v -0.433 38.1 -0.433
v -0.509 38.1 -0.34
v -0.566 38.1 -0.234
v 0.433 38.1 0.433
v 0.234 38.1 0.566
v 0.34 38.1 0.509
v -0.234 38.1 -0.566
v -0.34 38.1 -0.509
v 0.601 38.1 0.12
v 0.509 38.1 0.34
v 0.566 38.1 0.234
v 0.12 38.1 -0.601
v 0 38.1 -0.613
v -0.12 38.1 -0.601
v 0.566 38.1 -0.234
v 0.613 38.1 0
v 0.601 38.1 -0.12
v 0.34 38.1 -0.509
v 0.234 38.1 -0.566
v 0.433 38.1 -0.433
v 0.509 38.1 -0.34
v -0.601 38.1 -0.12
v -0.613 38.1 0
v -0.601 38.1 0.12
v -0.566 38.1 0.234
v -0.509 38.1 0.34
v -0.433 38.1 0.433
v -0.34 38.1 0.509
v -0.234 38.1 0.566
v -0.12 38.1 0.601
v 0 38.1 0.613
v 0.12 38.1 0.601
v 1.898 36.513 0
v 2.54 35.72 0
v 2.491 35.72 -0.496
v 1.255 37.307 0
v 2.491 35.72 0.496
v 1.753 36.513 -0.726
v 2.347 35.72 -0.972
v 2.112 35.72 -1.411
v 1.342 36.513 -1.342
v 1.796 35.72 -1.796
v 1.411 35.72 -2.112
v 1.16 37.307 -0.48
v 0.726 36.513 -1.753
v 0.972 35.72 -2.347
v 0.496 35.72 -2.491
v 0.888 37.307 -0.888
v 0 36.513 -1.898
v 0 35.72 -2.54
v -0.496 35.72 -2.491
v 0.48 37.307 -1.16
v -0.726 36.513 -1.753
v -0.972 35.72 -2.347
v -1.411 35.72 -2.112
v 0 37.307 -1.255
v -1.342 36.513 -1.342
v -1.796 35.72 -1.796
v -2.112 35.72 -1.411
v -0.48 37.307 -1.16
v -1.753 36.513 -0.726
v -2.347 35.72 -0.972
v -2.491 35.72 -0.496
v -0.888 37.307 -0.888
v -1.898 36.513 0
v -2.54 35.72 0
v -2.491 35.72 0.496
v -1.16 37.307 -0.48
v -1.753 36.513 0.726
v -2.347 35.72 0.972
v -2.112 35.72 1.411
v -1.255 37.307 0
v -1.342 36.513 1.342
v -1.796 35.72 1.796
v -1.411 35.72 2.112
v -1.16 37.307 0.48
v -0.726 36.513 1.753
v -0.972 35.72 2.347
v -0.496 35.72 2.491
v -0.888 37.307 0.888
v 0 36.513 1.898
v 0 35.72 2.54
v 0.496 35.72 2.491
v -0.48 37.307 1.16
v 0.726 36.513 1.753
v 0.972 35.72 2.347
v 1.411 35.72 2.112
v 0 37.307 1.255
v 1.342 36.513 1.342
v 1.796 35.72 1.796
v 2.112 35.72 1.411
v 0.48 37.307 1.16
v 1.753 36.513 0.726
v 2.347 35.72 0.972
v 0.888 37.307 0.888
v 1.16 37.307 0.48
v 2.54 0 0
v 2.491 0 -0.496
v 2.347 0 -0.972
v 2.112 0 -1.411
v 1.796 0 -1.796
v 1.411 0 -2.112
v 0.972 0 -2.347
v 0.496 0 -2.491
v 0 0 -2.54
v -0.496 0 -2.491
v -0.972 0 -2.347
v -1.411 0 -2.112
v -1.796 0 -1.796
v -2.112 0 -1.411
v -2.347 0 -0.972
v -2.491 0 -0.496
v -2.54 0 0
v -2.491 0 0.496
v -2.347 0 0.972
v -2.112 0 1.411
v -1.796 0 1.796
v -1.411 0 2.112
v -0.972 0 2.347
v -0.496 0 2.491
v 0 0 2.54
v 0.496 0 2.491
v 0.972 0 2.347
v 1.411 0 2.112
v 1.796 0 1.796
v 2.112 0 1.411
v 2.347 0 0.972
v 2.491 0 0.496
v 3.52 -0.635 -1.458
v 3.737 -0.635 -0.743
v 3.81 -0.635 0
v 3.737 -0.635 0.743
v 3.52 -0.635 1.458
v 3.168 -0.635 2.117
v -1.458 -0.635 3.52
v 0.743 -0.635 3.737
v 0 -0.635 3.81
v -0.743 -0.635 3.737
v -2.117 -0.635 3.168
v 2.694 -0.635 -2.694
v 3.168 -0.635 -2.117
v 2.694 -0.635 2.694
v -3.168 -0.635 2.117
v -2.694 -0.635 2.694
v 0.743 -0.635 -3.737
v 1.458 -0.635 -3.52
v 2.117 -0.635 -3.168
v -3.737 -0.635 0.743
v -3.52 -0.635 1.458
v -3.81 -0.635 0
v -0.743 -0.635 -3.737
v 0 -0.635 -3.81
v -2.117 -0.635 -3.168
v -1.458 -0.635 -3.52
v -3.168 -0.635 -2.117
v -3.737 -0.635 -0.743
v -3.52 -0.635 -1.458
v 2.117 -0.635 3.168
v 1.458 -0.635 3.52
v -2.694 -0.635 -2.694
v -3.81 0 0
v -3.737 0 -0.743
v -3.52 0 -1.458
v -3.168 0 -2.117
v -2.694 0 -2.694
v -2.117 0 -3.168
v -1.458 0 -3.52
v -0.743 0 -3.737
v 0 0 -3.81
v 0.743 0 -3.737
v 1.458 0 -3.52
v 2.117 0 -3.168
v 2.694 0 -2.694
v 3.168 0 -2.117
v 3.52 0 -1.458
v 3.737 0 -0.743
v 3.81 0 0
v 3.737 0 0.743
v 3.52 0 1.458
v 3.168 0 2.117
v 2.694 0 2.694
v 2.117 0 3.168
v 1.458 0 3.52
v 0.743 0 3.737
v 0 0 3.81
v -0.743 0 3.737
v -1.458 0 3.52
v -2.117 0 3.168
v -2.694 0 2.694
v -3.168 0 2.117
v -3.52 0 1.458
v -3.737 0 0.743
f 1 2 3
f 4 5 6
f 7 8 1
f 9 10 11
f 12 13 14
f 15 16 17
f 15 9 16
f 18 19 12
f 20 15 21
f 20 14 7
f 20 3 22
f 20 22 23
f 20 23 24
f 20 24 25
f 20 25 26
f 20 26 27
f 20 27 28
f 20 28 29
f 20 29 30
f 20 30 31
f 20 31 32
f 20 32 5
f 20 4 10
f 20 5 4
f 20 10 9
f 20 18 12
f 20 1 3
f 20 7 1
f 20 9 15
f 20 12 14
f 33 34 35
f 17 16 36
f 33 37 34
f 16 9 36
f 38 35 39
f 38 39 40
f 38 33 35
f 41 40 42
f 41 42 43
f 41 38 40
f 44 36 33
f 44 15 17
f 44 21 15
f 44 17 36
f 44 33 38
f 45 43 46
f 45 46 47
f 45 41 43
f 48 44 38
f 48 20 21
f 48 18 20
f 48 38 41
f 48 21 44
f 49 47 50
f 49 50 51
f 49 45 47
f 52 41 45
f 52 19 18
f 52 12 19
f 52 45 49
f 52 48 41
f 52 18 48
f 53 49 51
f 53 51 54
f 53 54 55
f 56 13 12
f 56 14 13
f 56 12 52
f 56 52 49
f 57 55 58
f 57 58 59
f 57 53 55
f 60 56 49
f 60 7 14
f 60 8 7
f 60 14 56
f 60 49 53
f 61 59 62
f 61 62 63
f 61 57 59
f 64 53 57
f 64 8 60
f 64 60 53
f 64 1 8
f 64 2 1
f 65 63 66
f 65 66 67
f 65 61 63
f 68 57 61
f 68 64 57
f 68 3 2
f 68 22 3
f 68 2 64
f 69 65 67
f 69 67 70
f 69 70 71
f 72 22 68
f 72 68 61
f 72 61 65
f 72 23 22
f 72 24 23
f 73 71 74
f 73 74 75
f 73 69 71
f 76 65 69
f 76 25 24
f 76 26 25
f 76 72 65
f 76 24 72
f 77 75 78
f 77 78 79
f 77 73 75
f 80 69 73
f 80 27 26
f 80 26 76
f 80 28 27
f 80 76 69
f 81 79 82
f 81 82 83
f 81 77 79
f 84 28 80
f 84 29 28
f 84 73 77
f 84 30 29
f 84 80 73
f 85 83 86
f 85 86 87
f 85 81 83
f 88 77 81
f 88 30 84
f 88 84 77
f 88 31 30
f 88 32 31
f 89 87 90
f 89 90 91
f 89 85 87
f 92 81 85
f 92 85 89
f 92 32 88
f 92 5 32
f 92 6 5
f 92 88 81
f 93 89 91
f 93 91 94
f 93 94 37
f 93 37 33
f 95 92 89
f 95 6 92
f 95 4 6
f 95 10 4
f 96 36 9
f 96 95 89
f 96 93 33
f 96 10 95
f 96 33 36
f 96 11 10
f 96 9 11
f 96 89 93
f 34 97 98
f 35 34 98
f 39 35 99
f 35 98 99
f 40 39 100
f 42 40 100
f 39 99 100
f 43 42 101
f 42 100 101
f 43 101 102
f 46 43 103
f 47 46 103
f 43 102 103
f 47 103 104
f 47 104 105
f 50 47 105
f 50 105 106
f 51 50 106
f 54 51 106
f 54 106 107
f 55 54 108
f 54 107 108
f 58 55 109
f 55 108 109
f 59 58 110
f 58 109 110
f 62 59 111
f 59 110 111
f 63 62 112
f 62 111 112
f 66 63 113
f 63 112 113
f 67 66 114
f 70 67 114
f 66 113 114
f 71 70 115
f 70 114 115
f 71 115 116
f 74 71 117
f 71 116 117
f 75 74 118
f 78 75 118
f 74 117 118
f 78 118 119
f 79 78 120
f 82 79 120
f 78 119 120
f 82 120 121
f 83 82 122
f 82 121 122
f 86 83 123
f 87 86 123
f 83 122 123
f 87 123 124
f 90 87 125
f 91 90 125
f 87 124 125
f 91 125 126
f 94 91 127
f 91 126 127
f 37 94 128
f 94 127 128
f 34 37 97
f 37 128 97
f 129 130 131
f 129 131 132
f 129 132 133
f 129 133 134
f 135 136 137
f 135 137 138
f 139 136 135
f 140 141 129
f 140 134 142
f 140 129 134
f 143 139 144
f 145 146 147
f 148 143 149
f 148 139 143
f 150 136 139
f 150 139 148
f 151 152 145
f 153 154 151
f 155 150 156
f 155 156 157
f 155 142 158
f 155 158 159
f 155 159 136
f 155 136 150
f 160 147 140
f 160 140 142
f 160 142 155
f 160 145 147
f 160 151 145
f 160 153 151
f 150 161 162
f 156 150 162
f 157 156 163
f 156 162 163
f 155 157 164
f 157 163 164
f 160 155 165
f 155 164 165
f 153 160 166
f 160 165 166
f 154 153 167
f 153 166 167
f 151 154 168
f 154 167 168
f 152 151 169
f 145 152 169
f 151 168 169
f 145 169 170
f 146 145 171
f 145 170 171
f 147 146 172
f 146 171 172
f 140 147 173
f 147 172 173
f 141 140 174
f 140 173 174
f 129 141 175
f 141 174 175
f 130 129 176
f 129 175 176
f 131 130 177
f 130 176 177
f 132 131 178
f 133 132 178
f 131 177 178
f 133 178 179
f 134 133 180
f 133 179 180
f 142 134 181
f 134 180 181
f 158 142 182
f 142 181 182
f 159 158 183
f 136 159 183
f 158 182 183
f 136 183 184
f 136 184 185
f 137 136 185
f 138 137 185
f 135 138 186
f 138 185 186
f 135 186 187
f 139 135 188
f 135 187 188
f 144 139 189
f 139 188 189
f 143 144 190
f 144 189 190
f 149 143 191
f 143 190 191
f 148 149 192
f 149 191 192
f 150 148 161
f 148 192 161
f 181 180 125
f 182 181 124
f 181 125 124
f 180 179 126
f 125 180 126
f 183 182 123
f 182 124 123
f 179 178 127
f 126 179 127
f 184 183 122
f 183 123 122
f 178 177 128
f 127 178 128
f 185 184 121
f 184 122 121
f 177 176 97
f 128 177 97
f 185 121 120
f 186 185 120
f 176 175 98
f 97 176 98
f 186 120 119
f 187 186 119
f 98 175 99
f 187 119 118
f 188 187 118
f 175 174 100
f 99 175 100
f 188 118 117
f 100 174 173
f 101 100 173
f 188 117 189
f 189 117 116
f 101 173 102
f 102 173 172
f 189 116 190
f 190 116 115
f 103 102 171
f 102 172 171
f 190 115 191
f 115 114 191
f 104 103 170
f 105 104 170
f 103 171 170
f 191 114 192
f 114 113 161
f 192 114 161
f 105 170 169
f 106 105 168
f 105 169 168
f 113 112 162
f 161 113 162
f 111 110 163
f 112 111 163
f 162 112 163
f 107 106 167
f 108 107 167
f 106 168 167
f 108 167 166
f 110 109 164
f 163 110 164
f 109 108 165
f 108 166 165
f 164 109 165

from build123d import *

# Parameters (mm, degrees)
SKETCH2_R           = 2.54
BOSS_EXTRUDE1_DEPTH = 38.1
CHAMFER1_SIZE       = 2.38
CHAMFER1_SIZE2      = 1.927285999
SKETCH3_R           = 3.81
BOSS_EXTRUDE2_DEPTH = 0.635


with BuildPart() as part:
    # Sketch2 → Boss-Extrude1 (new body)
    with BuildSketch(Plane(origin=(0, 0, 0), x_dir=(1, 0, 0), z_dir=(0, 1, 0))):
        Circle(SKETCH2_R)
    extrude(amount=BOSS_EXTRUDE1_DEPTH)

    # Chamfer1
    chamfer1_edges = [part.edges().sort_by_distance(p)[0] for p in [
        (-2.54, 38.1, 0),
    ]]
    chamfer1_side = [part.faces().sort_by_distance(p)[0] for p in [
        (-2.54, 19.05, 0),
    ]]
    chamfer(chamfer1_edges, length=CHAMFER1_SIZE, length2=CHAMFER1_SIZE2, reference=chamfer1_side[0])

    # Sketch3 → Boss-Extrude2 (add)
    with BuildSketch(Plane(origin=(0, 0, 0), x_dir=(-1, 0, 0), z_dir=(0, -1, 0))):
        Circle(SKETCH3_R)
    extrude(amount=BOSS_EXTRUDE2_DEPTH)


solid = part.part
